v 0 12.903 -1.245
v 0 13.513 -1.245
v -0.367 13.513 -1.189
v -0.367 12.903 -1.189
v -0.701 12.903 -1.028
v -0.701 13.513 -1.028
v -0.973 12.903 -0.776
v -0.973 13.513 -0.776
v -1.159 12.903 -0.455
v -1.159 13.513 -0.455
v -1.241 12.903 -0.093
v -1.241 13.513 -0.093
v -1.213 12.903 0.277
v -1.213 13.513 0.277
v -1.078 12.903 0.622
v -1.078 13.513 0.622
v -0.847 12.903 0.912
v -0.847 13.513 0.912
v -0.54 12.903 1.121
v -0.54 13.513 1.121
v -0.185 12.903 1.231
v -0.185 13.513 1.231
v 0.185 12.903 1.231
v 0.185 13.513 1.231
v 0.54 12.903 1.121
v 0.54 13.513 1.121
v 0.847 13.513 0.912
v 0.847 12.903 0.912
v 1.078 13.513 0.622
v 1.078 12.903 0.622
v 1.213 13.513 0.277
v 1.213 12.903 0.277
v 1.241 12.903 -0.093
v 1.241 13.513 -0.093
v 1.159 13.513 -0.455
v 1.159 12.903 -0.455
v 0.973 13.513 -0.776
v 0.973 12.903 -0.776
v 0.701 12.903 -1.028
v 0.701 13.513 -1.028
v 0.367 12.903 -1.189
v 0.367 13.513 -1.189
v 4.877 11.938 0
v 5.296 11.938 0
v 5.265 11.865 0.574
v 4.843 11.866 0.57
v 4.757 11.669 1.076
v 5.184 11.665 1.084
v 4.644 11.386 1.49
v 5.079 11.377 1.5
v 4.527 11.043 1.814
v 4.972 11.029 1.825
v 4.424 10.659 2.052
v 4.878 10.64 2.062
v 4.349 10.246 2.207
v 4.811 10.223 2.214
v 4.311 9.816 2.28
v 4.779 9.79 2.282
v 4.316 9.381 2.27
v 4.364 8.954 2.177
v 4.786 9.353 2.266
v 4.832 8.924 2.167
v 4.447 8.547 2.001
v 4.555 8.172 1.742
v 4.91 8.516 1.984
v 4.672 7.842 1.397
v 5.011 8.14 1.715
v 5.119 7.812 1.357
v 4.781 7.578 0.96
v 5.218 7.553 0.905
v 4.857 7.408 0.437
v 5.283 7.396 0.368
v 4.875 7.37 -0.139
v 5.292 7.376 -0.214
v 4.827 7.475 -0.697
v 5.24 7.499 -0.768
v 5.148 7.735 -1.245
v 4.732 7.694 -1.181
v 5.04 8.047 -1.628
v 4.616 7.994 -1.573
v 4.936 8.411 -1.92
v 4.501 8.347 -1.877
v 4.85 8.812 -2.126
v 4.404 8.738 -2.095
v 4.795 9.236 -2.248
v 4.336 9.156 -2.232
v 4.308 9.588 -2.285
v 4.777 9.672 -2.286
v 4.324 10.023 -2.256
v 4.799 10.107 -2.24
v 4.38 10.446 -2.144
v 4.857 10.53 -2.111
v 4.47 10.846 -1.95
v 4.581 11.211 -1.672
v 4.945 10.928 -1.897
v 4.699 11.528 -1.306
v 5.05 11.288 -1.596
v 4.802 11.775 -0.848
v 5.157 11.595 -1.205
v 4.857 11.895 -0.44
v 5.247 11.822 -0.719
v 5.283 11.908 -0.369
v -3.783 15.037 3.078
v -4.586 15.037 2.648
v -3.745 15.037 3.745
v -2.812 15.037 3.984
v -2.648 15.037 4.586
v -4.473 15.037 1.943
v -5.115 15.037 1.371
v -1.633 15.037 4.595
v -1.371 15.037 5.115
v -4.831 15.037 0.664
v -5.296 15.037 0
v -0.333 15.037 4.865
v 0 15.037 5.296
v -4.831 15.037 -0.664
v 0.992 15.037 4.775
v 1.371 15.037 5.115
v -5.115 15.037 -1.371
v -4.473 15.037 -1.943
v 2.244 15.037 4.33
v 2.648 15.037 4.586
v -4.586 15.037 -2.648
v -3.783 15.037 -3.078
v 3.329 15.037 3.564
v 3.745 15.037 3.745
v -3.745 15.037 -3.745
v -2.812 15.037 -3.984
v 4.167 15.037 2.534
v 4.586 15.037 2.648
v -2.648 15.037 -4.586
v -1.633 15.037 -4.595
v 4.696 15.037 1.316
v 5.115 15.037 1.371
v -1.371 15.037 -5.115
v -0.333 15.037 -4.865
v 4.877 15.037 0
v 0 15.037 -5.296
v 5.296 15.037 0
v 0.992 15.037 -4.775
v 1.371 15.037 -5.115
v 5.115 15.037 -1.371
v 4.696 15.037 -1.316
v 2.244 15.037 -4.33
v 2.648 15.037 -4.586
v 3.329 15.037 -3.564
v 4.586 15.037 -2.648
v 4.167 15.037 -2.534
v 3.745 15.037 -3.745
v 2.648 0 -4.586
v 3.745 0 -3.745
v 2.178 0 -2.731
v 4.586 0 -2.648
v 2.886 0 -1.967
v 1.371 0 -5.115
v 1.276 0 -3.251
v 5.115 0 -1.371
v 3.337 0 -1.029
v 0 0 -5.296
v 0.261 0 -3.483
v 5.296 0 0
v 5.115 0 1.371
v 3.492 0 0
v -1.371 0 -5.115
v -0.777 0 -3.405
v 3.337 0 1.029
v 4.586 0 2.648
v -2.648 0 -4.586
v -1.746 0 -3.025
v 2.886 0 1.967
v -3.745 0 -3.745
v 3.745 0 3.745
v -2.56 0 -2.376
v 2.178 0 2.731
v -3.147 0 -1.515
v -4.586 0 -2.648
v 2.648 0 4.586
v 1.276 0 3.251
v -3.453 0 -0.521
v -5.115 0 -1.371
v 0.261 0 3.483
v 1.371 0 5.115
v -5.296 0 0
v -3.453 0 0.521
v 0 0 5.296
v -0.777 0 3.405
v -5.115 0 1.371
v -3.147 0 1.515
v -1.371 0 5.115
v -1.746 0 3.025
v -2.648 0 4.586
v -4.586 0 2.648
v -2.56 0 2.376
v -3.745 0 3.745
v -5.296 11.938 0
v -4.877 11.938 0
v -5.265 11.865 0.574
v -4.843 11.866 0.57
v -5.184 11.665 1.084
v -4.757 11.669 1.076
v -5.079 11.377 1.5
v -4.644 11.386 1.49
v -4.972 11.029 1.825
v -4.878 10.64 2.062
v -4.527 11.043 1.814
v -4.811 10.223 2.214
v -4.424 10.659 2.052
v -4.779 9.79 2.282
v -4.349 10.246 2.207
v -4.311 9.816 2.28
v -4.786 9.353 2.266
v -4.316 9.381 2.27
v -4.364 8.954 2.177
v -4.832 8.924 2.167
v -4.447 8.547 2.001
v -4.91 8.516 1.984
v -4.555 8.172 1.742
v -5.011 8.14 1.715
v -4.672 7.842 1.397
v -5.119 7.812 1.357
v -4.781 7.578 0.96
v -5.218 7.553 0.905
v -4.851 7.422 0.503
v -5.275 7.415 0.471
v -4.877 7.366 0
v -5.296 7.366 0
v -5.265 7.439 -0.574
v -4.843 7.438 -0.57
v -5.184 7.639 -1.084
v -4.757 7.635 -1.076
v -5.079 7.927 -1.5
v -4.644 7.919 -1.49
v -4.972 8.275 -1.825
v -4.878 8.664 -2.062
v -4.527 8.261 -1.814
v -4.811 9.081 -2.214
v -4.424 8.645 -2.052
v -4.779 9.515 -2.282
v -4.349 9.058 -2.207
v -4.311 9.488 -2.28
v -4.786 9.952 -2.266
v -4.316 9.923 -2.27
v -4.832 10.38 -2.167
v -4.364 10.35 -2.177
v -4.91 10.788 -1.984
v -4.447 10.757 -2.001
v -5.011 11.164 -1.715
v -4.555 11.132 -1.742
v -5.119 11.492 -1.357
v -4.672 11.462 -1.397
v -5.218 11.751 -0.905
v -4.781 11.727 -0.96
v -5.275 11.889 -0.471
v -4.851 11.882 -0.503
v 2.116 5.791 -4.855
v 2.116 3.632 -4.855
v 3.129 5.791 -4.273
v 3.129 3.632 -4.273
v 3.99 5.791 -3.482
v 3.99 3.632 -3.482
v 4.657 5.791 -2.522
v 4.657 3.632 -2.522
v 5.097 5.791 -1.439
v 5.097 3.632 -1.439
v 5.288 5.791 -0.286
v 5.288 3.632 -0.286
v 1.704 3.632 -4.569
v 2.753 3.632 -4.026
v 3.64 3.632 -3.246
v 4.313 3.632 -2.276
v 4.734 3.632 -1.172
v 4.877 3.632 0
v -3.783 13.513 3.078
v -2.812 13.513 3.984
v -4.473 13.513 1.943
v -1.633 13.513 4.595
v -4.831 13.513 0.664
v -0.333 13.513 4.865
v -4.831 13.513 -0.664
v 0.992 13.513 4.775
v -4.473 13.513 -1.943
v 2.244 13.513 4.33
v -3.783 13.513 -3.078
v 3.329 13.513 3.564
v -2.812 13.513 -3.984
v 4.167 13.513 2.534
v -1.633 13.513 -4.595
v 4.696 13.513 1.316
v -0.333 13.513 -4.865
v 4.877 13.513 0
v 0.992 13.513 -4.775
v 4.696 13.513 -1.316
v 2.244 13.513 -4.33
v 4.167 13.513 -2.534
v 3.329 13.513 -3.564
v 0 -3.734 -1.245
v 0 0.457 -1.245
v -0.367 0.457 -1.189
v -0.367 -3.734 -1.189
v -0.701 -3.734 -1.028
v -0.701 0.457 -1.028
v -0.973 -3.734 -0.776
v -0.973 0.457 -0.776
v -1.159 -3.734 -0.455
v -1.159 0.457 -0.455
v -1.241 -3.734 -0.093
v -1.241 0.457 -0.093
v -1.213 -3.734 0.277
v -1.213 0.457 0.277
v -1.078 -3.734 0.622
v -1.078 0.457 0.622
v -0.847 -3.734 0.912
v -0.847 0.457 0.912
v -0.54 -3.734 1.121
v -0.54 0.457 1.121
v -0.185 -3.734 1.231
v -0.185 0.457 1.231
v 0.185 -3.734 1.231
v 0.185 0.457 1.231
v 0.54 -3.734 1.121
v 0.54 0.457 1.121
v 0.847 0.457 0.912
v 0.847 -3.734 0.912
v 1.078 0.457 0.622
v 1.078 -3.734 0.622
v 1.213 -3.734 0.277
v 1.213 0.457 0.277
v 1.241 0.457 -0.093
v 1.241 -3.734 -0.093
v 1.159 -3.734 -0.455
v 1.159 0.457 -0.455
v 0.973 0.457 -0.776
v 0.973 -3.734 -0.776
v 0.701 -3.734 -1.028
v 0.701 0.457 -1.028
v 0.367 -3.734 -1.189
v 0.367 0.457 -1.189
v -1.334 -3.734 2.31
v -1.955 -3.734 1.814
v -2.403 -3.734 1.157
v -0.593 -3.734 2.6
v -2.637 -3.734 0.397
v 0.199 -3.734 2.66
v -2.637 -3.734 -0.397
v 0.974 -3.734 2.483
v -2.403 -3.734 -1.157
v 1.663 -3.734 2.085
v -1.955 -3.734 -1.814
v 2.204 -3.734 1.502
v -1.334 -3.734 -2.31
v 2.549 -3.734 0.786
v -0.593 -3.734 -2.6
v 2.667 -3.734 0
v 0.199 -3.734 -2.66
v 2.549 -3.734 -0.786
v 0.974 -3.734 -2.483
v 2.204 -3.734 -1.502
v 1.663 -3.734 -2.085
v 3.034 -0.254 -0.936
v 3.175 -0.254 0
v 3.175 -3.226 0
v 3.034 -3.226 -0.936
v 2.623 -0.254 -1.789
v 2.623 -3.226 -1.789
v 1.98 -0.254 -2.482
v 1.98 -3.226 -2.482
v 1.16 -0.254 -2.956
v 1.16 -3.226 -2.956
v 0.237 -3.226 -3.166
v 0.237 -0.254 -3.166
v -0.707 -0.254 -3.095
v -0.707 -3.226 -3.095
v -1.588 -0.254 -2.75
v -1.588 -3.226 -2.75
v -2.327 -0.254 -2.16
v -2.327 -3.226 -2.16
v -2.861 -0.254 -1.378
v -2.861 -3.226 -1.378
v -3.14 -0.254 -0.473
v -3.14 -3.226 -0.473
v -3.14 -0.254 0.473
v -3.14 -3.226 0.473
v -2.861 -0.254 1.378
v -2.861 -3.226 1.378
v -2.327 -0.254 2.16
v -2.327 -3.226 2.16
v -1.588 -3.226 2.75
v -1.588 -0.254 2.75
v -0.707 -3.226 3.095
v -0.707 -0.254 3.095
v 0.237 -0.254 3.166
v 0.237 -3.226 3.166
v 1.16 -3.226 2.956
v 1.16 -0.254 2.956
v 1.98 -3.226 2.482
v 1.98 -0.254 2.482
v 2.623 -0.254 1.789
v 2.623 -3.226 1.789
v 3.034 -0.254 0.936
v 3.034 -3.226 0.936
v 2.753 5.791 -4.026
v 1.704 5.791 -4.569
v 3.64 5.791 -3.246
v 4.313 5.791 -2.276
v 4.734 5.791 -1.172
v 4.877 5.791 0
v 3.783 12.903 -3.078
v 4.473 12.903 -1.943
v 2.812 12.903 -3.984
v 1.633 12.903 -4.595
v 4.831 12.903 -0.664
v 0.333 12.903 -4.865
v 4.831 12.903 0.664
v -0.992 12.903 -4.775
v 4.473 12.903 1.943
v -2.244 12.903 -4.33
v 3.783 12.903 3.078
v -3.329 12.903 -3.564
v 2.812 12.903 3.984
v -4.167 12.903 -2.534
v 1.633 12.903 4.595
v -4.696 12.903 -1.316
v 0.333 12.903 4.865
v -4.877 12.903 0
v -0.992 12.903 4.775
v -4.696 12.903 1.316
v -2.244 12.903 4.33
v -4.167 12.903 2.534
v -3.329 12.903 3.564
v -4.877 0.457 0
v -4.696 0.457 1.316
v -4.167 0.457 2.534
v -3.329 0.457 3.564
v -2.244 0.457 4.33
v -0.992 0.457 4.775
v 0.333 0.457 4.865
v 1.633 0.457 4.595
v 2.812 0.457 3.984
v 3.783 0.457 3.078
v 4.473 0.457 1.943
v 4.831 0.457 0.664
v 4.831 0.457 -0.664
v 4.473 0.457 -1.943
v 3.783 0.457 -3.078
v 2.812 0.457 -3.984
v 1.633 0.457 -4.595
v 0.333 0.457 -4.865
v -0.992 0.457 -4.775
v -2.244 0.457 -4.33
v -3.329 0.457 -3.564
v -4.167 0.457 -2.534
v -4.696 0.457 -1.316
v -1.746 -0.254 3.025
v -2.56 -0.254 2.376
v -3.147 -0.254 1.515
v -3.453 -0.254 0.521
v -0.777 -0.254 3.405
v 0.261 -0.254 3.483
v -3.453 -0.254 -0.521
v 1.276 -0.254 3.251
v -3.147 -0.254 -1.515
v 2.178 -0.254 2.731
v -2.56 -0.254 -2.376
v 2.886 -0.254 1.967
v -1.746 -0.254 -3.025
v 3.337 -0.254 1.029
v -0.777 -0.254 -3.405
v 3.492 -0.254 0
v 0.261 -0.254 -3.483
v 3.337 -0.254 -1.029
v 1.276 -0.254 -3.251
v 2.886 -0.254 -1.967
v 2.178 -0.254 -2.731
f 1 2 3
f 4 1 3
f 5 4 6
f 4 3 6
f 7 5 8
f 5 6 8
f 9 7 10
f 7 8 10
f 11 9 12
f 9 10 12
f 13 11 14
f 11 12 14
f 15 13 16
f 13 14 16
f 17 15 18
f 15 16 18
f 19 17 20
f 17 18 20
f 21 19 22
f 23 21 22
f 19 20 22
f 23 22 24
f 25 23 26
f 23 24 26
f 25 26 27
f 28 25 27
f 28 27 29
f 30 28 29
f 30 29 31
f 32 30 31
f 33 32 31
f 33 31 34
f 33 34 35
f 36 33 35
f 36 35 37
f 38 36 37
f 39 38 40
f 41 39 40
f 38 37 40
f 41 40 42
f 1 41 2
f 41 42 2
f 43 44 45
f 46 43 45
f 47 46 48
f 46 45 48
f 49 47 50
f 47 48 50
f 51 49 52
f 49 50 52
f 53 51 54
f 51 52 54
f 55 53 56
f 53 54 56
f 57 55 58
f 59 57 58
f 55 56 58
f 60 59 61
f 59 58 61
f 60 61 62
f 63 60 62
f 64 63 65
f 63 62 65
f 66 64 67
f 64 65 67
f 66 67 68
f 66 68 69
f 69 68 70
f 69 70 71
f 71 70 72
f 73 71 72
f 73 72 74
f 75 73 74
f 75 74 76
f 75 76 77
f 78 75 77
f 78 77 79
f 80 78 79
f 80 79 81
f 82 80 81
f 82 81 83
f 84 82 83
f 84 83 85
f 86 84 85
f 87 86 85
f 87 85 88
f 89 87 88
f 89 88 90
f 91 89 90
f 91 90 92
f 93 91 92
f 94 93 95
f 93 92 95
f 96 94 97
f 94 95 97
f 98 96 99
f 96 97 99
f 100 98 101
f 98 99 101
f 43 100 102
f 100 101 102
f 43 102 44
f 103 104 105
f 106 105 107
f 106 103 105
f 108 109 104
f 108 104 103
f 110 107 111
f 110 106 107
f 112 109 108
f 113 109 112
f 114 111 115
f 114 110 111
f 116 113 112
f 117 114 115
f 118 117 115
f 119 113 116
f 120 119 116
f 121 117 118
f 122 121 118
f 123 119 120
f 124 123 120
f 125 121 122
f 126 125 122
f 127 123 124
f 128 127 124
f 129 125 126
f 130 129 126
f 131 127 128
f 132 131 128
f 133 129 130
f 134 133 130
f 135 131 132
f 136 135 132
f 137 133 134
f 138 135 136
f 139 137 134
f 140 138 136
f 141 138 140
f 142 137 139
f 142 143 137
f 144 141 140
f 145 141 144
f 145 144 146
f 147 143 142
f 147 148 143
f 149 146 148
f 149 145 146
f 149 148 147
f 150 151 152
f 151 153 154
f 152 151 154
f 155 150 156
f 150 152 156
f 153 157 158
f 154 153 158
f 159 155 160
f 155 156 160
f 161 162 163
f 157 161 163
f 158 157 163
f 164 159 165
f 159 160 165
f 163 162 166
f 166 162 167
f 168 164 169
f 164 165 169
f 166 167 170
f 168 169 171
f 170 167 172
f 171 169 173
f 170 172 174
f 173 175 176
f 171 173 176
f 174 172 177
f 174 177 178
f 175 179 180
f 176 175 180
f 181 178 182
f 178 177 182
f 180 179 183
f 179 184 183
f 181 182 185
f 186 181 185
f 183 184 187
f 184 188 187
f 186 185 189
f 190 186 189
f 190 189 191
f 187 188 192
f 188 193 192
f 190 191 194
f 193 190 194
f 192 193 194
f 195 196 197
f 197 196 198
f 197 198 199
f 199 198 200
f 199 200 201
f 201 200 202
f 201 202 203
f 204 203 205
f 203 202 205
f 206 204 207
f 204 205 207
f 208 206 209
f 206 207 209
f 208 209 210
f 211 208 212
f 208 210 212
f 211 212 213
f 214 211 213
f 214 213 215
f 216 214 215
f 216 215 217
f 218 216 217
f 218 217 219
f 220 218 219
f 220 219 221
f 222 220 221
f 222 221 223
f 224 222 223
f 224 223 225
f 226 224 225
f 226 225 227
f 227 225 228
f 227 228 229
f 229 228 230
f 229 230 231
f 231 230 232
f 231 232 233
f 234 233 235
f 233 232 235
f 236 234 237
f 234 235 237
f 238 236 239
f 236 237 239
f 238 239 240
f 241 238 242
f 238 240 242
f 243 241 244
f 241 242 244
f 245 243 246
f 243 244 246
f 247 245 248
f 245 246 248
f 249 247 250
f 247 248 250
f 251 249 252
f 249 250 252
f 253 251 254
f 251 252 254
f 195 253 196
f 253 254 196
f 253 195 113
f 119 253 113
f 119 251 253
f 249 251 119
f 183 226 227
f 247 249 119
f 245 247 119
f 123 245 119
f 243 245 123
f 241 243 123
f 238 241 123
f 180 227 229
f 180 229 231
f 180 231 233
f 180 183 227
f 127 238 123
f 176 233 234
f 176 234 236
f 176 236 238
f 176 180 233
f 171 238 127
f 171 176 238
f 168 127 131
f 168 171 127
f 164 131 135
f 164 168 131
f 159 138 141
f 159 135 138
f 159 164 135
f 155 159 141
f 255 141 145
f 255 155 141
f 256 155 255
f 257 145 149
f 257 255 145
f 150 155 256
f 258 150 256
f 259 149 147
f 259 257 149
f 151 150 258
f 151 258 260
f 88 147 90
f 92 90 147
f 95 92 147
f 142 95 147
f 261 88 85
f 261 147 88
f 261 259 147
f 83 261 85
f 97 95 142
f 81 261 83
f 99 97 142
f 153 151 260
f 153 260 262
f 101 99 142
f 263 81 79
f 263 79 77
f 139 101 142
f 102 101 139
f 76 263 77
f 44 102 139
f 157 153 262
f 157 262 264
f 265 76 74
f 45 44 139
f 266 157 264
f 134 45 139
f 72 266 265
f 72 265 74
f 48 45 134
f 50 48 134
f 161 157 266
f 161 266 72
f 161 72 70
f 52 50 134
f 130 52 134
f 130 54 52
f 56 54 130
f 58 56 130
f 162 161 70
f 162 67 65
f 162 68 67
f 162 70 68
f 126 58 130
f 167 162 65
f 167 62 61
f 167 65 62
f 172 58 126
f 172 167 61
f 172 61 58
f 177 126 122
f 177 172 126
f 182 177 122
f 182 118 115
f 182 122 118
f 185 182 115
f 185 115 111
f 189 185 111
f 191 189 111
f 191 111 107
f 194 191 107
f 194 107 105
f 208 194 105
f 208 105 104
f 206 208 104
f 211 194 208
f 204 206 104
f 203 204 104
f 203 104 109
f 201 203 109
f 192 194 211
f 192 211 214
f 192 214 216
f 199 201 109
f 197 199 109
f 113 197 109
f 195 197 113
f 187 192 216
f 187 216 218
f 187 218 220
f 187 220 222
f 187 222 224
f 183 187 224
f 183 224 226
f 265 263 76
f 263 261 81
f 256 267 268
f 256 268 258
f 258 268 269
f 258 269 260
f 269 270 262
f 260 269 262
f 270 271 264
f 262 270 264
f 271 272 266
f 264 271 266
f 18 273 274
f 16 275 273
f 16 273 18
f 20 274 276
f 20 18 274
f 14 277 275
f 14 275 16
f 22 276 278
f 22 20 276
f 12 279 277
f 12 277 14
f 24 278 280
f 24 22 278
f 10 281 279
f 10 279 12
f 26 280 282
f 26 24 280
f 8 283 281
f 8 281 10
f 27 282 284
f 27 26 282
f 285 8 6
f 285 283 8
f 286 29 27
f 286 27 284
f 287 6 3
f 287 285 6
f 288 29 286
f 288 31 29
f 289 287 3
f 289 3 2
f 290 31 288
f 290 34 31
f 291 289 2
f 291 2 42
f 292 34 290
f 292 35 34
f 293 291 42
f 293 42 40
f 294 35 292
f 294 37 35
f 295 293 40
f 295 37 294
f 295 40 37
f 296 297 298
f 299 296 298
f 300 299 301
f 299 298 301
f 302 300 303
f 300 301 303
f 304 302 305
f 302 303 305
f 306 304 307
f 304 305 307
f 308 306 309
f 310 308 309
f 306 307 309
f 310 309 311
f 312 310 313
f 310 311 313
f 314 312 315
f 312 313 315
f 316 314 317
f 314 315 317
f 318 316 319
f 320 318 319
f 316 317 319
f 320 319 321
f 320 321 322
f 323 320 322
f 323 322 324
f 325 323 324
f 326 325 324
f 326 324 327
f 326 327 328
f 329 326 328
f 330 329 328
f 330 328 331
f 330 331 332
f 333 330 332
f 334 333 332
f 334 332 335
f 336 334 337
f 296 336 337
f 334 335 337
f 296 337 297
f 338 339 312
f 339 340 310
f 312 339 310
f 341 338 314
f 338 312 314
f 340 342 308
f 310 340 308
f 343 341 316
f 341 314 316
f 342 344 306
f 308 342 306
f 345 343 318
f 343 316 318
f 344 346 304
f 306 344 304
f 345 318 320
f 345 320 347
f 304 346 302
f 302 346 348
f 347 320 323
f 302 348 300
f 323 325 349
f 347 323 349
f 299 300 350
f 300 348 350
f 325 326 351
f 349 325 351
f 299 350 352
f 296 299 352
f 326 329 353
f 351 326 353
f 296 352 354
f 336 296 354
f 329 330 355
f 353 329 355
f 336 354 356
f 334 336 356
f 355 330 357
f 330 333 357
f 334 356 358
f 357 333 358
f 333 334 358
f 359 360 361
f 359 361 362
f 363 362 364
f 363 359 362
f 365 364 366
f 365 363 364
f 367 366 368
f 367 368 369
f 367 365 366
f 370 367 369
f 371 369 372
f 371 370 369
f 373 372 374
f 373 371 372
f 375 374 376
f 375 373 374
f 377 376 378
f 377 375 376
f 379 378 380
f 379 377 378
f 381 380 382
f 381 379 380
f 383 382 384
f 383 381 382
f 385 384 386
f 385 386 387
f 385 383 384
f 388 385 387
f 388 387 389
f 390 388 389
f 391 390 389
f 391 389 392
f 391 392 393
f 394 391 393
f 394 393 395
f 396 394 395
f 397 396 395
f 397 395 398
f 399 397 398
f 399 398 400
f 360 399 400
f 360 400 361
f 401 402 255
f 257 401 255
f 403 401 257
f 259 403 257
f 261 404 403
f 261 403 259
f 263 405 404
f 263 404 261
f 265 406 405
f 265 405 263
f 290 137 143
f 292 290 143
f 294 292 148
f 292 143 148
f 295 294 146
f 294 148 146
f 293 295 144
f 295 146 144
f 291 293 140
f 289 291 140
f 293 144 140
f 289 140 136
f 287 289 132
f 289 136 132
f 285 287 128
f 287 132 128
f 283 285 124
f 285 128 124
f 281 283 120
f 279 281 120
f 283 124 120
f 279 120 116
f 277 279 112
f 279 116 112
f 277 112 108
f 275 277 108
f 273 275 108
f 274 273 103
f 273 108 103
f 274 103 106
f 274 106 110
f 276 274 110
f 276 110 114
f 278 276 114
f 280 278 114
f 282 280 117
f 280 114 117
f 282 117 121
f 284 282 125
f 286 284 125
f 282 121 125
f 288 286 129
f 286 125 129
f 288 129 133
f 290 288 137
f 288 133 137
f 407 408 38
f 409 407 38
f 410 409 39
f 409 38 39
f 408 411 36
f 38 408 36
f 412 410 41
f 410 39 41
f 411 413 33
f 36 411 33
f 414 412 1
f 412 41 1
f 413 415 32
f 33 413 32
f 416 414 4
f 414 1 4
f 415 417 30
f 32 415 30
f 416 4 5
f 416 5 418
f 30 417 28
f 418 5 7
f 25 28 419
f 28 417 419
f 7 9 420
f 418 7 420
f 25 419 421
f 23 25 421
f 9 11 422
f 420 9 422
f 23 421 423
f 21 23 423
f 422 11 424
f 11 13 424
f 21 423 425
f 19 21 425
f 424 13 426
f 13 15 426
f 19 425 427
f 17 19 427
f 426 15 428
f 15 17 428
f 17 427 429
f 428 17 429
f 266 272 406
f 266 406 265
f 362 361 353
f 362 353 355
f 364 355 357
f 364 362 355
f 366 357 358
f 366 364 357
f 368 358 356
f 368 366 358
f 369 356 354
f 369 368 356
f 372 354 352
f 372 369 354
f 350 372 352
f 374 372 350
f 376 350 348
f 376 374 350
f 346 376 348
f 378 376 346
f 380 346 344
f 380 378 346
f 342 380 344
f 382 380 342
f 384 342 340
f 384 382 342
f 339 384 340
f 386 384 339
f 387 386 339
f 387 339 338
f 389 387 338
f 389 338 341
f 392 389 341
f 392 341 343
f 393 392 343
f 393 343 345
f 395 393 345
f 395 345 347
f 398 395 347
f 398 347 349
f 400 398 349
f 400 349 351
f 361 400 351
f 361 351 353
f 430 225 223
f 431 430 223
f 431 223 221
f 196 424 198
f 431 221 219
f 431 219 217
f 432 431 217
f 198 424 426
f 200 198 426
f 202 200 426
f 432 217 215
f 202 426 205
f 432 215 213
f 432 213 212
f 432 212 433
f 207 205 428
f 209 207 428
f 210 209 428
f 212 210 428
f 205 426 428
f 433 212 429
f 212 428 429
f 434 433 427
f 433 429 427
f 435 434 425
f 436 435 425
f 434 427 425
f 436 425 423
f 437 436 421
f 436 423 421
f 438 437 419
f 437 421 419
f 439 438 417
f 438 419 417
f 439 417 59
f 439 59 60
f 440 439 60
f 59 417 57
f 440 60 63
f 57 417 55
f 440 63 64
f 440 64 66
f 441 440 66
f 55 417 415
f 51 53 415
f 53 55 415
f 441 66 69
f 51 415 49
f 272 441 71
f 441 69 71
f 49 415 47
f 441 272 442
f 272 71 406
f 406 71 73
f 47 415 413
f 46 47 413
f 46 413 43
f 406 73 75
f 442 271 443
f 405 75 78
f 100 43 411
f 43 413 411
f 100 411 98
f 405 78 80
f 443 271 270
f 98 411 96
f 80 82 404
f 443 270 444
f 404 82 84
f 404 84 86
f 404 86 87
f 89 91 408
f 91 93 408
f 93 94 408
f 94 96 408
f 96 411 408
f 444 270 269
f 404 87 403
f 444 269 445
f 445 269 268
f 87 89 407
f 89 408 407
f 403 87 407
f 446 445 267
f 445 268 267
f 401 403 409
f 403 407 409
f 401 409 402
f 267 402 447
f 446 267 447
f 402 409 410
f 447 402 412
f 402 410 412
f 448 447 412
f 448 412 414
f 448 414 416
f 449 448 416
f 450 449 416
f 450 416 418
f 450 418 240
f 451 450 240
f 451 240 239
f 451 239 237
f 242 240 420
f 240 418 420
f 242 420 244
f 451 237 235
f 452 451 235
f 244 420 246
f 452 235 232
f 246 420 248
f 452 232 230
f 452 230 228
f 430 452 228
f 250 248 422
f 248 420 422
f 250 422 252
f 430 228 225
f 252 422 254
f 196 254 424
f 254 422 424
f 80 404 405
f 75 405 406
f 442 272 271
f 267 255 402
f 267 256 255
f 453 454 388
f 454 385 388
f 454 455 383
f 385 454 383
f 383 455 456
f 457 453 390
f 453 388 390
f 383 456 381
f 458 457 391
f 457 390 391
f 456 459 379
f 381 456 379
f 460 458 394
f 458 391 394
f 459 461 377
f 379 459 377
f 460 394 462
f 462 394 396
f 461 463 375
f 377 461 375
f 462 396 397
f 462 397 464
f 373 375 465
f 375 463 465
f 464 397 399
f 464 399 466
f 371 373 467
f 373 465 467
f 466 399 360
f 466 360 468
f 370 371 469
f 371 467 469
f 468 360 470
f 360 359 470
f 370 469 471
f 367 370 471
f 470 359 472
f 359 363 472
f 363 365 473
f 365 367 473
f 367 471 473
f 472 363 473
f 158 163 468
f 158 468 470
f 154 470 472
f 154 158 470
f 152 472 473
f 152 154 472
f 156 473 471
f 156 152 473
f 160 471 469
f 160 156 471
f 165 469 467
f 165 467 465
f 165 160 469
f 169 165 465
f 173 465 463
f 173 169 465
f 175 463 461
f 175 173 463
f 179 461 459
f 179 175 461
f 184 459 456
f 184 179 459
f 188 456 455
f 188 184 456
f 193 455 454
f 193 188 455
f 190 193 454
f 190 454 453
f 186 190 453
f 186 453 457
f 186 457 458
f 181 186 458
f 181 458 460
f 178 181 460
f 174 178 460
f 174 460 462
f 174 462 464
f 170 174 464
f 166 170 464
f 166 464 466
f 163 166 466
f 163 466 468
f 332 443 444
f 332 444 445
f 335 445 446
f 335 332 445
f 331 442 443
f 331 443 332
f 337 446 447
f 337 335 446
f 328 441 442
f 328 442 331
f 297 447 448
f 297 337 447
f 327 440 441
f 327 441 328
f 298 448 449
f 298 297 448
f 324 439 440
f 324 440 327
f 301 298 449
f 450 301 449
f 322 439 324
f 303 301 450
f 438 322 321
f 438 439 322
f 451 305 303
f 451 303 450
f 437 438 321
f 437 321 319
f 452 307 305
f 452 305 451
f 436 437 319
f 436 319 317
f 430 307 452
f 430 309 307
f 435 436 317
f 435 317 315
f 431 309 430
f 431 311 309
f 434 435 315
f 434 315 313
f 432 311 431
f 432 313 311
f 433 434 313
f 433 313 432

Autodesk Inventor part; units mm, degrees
ref_plane "YZ Plane" through (0, 0, 0) normal (1, 0, 0) x (0, 1, 0)
ref_plane "XZ Plane" through (0, 0, 0) normal (0, 1, 0) x (-1, 0, 0)
ref_plane "XY Plane" through (0, 0, 0) normal (0, 0, 1) x (1, 0, 0)
sketch "Sketch1" plane through (0, 0, 0) normal (0, 1, 0) x (-1, 0, 0)
  circle A0 centre (0, 0) radius 5.2959
  dimension "d0" = 10.5918
extrude "Extrusion1" add sketch "Sketch1" along normal blind 15.0368
sketch "Sketch3" plane through (0, 15.0368, 0) normal (0, 1, 0) x (1, 0, 0)
  circle A0 centre (0, 0) radius 3.4925
  dimension "d6" = 6.985
extrude "Extrusion3" add sketch "Sketch3" against normal blind 15.2908
sketch "Sketch4" plane through (0, 15.0368, 0) normal (0, 1, 0) x (1, 0, 0)
  circle A0 centre (0, 0) radius 3.175
  dimension "d9" = 6.35
extrude "Extrusion4" add sketch "Sketch4" against normal blind 18.7706
sketch "Sketch9" plane through (0, -3.7338, 0) normal (0, -1, 0) x (1, 0, 0)
  circle A0 centre (0, 0) radius 5.2959 projected
hole "Hole1" at (0, -3.7338, 0) direction (0, 1, 0) diameter 2.4892 end through all
sketch "Sketch10" plane through (0, 0, 0) normal (1, 0, 0) x (0, 1, 0)
  line L0 (15.0368, -5.2959) -> (15.0368, 5.2959) projected
  line L1 (15.0368, -5.256) -> (9.6521, -5.2959)
  line L2 (0, -5.2959) -> (15.0368, -5.2959) projected
  circle A0 centre (9.6521, 0) radius 2.286
  point P0 (0, 0)
  dimension "d33" = 5.3848
  dimension "d34" = 4.572
extrude "Extrusion7" cut sketch "Sketch10" along normal mid plane 12.446 contours A0
sketch "Sketch5" plane through (0, 15.0368, 0) normal (0, 1, 0) x (1, 0, 0)
  circle A0 centre (0, 0) radius 4.8768
  dimension "d12" = 9.7536
extrude "Extrusion5" cut sketch "Sketch5" against normal blind 1.524
ref_plane "Work Plane3" through (0, 12.9032, 0) normal (0, 1, 0) x (-1, 0, 0)
sketch "Sketch8" plane through (0, 12.9032, 0) normal (0, 1, 0) x (-1, 0, 0)
  circle A0 centre (0, 0) radius 4.8768
extrude "Extrusion6" cut sketch "Sketch8" against normal blind 12.446
ref_plane "Work Plane4" through (0, 3.6322, 0) normal (0, -1, 0) x (1, 0, 0)
chamfer "Chamfer1" distance 0.508 angle 45 1 edges at (-3.175, -3.7338, 0)
sketch "Sketch11" plane through (0, 3.6322, 0) normal (0, -1, 0) x (1, 0, 0)
  circle A0 centre (0, 0) radius 5.2959 projected
  circle A1 centre (0, 0) radius 4.8768 projected
  line L0 (4.8768, 0) -> (1.7044, -4.5693)
  line L1 (2.1158, -4.8549) -> (5.2959, -0.291)
  line L2 (4.8768, 0) -> (5.9401, -0.7399)
  line L3 (5.9401, -0.7399) -> (2.763, -5.3059)
  line L4 (2.763, -5.3059) -> (1.7044, -4.5693)
  dimension "d37" = 5.5626
  dimension "d38" = 1.2954
extrude "Extrusion8" cut sketch "Sketch11" against normal blind 2.159 contours L1 A1 A0 | L4 A1 L1 | A0 L1 L2 L3 L4 | L2 L1 A0 | A0 L1 A1 L2 | L1 A1 | A1 L0 L1 | A1 L0
thread "Thread1" size "1/4-20 UNC" class "2A" standard "ANSI Unified Screw Threads" full length
properties part number "Mixture  Control"
